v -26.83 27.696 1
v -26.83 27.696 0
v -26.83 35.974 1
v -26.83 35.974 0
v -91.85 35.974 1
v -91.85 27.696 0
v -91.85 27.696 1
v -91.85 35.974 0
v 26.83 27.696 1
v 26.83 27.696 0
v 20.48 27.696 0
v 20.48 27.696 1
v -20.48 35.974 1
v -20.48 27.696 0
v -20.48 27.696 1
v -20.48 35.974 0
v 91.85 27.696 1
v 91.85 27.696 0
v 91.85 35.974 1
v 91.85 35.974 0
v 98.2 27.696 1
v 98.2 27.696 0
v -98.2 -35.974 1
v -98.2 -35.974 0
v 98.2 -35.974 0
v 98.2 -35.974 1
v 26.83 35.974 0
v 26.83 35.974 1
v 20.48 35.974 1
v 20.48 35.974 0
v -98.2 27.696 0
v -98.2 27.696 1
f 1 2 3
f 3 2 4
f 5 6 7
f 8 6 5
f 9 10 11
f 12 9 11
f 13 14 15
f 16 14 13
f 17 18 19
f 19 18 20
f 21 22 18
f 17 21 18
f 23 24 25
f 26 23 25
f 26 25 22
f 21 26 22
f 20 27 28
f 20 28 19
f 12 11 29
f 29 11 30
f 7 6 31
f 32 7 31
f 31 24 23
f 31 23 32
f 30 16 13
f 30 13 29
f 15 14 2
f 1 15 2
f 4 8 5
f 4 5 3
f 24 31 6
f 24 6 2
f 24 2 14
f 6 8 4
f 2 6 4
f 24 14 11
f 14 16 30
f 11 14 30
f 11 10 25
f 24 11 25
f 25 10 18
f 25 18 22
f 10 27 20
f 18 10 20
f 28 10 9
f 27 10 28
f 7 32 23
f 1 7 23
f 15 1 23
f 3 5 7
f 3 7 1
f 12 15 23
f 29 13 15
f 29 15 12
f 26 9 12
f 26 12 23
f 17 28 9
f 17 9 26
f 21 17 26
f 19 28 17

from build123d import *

# Parameters (mm, degrees)
CROQUIS1_W              = 196.4
CROQUIS1_H              = 71.948
SALIENTE_EXTRUIR1_DEPTH = 1
CROQUIS5_W              = 6.35
CROQUIS5_H              = 8.278
CORTAR_EXTRUIR2_DEPTH   = 2


with BuildPart() as part:
    # Croquis1 → Saliente-Extruir1 (new body)
    with BuildSketch(Plane.XY):
        Rectangle(CROQUIS1_W, CROQUIS1_H)
    extrude(amount=SALIENTE_EXTRUIR1_DEPTH)

    # Croquis5 → Cortar-Extruir2 (cut, through all)
    with BuildSketch(Plane(origin=(0, 0, 0), x_dir=(-1, 0, 0), z_dir=(0, 0, -1))):
        with Locations((-95.025, 31.835)):
            Rectangle(CROQUIS5_W, CROQUIS5_H)
        with Locations((-23.655, 31.835)):
            Rectangle(CROQUIS5_W, CROQUIS5_H)
        with Locations((23.655, 31.835)):
            Rectangle(CROQUIS5_W, CROQUIS5_H)
        with Locations((95.025, 31.835)):
            Rectangle(CROQUIS5_W, CROQUIS5_H)
    extrude(amount=-CORTAR_EXTRUIR2_DEPTH, mode=Mode.SUBTRACT)


solid = part.part
